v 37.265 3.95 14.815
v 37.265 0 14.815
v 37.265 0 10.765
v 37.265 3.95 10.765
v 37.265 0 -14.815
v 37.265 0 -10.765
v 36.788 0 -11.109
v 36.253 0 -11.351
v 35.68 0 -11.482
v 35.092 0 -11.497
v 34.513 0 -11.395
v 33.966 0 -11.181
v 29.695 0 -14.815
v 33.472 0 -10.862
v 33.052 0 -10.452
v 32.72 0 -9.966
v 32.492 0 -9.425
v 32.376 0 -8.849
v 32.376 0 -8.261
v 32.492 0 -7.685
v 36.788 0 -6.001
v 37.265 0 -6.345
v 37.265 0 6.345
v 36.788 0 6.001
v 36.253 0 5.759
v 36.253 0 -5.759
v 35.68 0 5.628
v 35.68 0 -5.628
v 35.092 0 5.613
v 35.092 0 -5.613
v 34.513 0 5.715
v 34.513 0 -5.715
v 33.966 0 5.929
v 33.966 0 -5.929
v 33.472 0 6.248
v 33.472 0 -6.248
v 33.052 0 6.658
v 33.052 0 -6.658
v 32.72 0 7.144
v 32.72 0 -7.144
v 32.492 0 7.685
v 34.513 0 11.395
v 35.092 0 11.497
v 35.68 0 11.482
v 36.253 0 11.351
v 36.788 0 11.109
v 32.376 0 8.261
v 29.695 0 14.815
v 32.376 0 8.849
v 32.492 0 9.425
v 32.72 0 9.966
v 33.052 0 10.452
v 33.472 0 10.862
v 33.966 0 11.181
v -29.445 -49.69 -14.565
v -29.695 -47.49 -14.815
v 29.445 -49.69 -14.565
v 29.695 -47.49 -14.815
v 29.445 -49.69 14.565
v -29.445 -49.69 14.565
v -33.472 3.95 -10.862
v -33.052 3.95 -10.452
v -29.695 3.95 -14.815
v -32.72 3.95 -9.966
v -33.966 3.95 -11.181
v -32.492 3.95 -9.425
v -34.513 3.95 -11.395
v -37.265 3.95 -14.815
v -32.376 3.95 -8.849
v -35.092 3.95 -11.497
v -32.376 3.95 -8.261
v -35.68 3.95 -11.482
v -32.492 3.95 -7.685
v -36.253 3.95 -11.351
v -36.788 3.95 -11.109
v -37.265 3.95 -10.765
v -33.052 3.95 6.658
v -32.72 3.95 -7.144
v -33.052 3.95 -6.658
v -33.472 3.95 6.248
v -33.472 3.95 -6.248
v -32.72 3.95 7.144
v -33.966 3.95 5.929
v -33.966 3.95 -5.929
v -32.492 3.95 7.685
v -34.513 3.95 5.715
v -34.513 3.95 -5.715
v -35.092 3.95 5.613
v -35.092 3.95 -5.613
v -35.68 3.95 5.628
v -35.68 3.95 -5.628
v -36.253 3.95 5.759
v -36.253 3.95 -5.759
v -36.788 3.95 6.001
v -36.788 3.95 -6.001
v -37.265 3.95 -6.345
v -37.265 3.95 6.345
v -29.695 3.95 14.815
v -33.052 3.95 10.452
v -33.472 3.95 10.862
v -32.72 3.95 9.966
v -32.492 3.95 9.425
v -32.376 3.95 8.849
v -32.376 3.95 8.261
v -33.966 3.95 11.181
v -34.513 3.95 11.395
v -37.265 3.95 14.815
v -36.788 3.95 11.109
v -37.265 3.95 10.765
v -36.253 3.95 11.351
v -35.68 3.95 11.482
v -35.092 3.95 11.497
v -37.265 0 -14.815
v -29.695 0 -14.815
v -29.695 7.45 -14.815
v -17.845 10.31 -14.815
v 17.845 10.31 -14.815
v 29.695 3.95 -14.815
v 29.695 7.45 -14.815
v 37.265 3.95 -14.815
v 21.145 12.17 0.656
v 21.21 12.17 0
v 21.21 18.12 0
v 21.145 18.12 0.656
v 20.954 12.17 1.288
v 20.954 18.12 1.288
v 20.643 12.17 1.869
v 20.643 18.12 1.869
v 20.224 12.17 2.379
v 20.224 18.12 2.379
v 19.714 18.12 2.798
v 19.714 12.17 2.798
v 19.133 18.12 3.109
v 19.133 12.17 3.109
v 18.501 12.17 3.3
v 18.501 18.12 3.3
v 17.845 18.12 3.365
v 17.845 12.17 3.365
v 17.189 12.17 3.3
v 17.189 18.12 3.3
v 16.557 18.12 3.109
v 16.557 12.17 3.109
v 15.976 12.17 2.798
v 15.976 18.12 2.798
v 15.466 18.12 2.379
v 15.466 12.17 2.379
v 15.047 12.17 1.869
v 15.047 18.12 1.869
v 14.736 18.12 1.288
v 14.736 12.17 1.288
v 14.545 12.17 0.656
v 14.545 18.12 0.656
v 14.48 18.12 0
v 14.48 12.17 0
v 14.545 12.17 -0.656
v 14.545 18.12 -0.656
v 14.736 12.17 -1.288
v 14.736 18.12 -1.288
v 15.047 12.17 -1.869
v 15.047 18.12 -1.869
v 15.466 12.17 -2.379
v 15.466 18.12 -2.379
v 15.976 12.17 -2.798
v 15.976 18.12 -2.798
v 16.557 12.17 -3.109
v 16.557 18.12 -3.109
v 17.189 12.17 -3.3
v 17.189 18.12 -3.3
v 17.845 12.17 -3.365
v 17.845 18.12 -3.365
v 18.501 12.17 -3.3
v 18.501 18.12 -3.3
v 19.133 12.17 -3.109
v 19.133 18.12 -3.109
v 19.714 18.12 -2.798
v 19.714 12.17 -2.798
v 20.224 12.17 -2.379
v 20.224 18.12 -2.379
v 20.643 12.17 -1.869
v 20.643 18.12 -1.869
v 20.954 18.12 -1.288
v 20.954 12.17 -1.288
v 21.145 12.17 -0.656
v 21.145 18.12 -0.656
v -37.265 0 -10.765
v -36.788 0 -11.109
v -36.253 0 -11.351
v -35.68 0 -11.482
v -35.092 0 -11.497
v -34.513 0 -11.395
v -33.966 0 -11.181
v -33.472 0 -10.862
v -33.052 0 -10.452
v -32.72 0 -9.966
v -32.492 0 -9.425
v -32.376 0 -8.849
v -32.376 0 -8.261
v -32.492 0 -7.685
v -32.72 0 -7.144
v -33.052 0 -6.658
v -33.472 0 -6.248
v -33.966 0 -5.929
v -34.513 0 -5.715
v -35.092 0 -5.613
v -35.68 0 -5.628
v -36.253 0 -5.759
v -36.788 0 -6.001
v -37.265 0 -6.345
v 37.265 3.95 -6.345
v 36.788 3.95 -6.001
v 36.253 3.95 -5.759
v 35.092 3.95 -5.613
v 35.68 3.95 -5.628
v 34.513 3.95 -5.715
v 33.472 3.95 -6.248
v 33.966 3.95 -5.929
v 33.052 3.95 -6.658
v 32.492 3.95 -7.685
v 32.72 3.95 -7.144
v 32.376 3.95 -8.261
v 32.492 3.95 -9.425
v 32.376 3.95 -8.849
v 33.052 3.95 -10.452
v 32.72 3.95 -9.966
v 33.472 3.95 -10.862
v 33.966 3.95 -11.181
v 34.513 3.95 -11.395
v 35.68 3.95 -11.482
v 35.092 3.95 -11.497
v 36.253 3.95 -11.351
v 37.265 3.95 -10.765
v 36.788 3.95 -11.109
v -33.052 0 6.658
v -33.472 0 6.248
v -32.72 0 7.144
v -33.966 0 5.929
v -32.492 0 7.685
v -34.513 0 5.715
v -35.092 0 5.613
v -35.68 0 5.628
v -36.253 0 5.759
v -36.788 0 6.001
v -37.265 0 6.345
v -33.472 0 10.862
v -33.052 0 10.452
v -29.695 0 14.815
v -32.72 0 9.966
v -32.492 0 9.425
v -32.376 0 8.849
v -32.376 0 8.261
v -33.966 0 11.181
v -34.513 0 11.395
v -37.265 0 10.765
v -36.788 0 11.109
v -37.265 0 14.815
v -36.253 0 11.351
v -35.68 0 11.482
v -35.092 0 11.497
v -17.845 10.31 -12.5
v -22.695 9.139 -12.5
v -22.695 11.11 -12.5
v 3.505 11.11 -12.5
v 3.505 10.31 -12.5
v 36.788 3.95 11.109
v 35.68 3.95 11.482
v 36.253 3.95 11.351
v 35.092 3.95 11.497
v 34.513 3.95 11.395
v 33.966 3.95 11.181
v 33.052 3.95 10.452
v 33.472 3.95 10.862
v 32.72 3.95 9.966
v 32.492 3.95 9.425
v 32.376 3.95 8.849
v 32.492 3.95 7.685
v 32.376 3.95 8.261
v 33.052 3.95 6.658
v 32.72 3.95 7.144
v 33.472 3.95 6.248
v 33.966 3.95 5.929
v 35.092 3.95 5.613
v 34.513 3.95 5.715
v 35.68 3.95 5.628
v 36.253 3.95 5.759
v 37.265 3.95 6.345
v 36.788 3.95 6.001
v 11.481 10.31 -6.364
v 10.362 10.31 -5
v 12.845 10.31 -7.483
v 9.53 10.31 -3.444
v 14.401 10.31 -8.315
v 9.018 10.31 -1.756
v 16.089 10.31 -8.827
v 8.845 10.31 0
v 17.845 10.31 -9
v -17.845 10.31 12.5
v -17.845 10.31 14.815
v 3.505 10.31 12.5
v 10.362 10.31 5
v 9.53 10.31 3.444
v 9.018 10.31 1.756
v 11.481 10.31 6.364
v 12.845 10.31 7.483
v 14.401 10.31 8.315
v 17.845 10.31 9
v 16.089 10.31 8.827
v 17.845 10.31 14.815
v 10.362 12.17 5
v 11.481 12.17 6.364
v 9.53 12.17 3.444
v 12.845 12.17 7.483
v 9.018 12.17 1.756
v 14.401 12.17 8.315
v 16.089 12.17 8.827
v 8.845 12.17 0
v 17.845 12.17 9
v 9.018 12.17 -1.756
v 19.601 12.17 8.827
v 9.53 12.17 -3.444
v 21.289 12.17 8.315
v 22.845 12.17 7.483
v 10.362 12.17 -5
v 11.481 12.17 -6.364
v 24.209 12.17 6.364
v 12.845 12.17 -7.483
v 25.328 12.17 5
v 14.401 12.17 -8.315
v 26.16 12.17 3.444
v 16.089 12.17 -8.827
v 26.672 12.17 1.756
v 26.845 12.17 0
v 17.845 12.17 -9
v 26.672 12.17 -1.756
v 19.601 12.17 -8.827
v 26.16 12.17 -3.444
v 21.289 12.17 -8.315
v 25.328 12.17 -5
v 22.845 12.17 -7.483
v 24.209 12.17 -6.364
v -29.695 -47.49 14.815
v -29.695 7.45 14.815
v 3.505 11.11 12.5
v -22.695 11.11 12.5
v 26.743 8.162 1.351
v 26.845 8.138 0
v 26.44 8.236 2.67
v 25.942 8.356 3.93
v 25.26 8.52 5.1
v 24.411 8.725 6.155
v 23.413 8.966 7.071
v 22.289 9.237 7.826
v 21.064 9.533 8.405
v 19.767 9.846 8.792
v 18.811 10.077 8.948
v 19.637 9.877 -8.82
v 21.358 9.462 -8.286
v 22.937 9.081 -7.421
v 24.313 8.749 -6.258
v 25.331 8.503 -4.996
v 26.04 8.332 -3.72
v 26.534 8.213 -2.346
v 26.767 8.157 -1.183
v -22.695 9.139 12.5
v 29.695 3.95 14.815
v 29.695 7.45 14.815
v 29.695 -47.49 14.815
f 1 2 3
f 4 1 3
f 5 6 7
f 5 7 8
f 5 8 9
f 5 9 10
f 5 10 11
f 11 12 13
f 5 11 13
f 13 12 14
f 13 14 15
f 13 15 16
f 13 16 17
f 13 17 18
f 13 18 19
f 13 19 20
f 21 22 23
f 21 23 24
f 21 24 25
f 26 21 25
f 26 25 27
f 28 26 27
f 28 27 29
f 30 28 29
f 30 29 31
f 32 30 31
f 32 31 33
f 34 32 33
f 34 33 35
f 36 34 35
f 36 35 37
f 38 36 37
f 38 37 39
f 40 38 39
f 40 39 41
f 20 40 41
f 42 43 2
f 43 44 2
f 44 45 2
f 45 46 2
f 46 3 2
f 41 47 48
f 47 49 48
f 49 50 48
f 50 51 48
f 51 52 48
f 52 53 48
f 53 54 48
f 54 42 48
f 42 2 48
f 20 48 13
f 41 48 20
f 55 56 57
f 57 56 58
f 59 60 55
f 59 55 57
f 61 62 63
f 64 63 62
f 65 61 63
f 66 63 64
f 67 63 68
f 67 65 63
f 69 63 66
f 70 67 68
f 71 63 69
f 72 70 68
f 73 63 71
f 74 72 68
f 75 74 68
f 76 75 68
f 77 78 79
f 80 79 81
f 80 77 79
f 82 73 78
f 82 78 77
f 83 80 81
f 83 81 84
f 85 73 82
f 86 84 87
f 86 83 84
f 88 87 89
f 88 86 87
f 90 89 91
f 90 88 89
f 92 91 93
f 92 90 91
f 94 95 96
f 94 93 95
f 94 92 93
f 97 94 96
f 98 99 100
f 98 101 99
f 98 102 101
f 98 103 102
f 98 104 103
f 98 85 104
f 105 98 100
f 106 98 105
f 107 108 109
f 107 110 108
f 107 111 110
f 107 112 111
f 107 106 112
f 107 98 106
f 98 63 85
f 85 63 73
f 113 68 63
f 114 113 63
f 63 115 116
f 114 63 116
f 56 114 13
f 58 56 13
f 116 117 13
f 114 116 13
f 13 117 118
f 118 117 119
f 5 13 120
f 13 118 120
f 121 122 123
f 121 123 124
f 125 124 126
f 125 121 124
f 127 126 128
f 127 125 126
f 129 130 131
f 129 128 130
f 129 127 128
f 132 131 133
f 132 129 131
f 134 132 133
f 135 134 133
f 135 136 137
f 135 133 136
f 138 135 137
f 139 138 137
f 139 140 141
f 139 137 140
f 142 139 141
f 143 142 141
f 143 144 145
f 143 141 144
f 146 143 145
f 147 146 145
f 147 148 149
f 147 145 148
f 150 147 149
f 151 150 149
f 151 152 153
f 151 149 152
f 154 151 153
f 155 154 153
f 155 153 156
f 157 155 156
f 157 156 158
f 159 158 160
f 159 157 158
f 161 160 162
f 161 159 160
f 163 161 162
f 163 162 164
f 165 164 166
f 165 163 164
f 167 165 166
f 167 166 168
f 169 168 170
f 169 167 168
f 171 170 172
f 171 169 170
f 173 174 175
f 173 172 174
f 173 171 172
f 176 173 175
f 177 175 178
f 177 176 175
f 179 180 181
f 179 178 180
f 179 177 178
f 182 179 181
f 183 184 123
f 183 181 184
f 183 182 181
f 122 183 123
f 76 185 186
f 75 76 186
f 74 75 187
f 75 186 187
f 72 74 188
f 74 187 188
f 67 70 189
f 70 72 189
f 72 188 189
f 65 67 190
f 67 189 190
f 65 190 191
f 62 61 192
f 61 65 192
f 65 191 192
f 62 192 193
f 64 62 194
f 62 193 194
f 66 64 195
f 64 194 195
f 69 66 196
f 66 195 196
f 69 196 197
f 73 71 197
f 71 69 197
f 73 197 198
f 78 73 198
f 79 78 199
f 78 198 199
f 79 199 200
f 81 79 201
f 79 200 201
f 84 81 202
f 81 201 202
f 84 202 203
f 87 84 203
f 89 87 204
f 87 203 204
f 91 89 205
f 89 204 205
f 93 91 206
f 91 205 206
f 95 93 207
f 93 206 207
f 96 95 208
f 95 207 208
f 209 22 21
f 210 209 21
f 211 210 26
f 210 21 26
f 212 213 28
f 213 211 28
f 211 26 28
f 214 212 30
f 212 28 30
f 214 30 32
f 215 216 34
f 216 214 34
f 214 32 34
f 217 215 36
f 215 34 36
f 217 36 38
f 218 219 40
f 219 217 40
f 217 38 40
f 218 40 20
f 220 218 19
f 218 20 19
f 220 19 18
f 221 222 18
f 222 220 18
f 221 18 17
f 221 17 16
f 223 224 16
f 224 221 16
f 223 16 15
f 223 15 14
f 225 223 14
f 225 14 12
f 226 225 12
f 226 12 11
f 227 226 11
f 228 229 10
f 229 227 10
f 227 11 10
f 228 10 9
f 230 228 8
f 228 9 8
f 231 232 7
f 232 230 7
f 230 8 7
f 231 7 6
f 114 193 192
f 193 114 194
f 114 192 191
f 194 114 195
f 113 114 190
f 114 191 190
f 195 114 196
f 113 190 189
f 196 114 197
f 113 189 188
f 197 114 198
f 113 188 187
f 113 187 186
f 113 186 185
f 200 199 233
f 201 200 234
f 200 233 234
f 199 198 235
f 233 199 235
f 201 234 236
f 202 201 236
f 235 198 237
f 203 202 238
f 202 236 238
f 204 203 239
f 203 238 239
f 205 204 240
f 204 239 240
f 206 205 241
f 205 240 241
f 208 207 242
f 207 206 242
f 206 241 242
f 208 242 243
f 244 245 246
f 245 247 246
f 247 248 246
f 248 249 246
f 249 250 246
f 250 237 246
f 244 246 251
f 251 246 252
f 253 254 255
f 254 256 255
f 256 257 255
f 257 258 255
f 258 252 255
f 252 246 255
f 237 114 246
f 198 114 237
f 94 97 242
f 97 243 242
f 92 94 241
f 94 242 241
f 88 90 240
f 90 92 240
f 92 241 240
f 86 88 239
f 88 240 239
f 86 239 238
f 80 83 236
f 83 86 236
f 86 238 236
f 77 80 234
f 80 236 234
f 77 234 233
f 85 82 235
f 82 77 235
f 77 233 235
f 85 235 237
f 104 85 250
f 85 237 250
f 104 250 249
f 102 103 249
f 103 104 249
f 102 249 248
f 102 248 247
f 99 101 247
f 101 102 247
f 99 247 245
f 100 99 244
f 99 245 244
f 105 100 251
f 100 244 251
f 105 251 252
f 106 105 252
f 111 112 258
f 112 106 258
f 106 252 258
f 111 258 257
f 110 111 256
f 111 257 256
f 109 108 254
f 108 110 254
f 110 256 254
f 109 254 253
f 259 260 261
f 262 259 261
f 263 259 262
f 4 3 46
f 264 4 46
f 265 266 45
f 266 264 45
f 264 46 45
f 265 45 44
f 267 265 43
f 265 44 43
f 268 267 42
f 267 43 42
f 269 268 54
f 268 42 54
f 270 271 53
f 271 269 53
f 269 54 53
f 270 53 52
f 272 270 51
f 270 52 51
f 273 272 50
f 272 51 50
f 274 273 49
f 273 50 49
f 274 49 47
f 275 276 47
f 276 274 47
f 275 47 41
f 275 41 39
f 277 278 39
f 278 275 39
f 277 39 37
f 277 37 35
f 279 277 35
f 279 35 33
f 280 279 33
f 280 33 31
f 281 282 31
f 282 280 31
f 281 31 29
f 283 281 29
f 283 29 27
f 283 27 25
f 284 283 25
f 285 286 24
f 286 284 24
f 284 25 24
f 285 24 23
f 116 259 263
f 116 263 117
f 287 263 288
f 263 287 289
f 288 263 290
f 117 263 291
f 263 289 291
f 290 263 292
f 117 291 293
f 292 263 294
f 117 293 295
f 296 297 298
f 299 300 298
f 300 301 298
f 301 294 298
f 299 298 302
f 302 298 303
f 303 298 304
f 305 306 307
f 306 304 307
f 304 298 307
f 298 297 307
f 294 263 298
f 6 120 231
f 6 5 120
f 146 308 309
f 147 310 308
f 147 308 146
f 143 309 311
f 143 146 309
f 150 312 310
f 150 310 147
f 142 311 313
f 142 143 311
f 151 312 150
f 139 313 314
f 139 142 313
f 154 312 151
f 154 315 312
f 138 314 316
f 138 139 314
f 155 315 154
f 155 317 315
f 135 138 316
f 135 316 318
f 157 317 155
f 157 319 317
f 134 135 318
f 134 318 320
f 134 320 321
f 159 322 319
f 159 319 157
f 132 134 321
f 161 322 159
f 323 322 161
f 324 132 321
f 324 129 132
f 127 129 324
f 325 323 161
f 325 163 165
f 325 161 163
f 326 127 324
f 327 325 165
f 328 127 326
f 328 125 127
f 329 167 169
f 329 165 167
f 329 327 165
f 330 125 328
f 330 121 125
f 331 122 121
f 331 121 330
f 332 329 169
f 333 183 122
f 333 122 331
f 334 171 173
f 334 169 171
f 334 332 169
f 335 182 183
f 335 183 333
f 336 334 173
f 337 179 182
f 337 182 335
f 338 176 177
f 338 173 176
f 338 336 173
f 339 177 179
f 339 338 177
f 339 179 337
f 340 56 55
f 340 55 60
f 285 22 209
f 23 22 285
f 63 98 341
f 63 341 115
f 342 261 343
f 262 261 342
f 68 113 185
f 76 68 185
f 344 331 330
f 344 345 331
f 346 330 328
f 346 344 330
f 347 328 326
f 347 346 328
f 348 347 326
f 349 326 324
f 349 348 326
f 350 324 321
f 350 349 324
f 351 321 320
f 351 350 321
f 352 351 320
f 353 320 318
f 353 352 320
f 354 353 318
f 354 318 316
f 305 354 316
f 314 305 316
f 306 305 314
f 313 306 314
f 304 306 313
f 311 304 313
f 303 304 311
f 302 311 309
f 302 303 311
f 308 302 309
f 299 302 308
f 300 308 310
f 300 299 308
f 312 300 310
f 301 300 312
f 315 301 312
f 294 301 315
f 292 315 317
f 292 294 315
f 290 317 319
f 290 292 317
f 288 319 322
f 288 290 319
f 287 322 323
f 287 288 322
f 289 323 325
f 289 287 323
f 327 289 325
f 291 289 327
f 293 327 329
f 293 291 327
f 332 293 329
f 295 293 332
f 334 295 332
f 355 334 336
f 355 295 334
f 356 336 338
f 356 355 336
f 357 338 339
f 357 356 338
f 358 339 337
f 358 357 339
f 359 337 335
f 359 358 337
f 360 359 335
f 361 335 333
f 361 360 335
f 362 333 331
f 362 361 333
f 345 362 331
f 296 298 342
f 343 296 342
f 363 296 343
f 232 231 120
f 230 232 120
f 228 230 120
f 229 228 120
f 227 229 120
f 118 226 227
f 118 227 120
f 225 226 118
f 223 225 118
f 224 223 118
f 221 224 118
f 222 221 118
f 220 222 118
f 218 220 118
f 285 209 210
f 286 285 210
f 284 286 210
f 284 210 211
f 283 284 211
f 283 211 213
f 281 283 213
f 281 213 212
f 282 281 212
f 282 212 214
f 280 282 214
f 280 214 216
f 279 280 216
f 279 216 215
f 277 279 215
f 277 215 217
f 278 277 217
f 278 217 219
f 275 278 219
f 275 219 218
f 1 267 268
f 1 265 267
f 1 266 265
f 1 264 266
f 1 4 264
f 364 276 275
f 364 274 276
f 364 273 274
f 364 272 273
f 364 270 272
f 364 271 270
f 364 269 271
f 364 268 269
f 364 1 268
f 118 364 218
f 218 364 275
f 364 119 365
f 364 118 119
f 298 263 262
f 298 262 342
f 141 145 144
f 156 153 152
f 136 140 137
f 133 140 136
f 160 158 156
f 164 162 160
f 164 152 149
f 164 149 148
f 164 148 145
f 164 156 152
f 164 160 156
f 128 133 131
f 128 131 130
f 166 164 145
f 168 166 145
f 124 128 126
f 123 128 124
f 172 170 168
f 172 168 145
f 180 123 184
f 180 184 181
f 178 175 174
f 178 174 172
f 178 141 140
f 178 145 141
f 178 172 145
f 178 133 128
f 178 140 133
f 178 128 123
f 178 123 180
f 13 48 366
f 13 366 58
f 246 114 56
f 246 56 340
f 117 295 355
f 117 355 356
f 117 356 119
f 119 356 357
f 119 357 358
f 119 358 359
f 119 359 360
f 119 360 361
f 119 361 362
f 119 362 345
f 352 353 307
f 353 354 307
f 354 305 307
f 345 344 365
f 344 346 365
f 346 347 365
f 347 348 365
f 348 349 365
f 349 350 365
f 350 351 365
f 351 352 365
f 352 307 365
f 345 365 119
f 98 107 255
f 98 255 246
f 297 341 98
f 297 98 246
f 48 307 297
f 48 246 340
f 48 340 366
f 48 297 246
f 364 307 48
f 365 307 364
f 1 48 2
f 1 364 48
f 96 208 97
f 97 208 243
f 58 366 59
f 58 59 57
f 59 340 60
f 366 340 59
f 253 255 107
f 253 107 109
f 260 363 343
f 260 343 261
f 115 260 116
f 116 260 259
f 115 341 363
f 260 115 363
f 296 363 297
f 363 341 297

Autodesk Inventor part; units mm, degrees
ref_plane "YZ Plane" through (0, 0, 0) normal (1, 0, 0) x (0, 1, 0)
ref_plane "XZ Plane" through (0, 0, 0) normal (0, 1, 0) x (-1, 0, 0)
ref_plane "XY Plane" through (0, 0, 0) normal (0, 0, 1) x (1, 0, 0)
sketch "Sketch1" plane through (0, 0, 0) normal (0, 1, 0) x (-1, 0, 0)
  line L0 (0, -23.3131) -> (0, 24.6505)
  line L1 (49.2542, 0) -> (-47.6933, 0)
  arc A0 (37.265, -6.345) -> (37.265, -10.765) centre (35.3109, -8.555) ccw
  line L2 (37.265, -14.815) -> (37.265, -10.765)
  arc A1 (37.265, 10.765) -> (37.265, 6.345) centre (35.3109, 8.555) ccw
  line L3 (37.265, 14.815) -> (37.265, 10.765)
  line L4 (37.265, -6.345) -> (37.265, 6.345)
  line L5 (37.265, -14.815) -> (29.695, -14.815)
  line L6 (37.265, 14.815) -> (29.695, 14.815)
  arc A2 (-37.265, -10.765) -> (-37.265, -6.345) centre (-35.3109, -8.555) ccw
  line L7 (-37.265, -14.815) -> (-37.265, -10.765)
  line L8 (-37.265, 14.815) -> (-37.265, 10.765)
  arc A3 (-37.265, 6.345) -> (-37.265, 10.765) centre (-35.3109, 8.555) ccw
  line L9 (-37.265, -6.345) -> (-37.265, 6.345)
  line L10 (-37.265, -14.815) -> (-29.695, -14.815)
  line L11 (-37.265, 14.815) -> (-29.695, 14.815)
  line L12 (29.695, -14.815) -> (-29.695, -14.815)
  line L13 (-29.695, 14.815) -> (29.695, 14.815)
  line L14 (29.695, -14.815) -> (29.695, 14.815)
  line L15 (-29.695, -14.815) -> (-29.695, 14.815)
  point P0 (0, 0)
  dimension "d3" = 4.42
  dimension "d6" = 2.95
  dimension "d7" = 7.57
  dimension "d8" = 3.31
  dimension "d9" = 59.39
  dimension "d10" = 29.63
extrude "Extrusion1" add sketch "Sketch1" along normal blind 3.95
sketch "Sketch2" plane through (0, 3.95, 0) normal (0, 1, 0) x (1, 0, 0)
  line L0 (37.265, 14.815) -> (-37.265, 14.815) projected
  line L1 (-37.265, -14.815) -> (37.265, -14.815) projected
  line L2 (-29.695, 14.815) -> (29.695, 14.815)
  line L3 (29.695, 14.815) -> (29.695, -14.815)
  line L4 (29.695, -14.815) -> (-29.695, -14.815)
  line L5 (-29.695, -14.815) -> (-29.695, 14.815)
  point P0 (0, 0)
  dimension "d13" = 59.39
  dimension "d14" = 29.695
extrude "Extrusion2" add sketch "Sketch2" along normal blind 3.5
sketch "Sketch3" plane through (0, 0, 0) normal (0, -1, 0) x (1, 0, 0)
  line L0 (37.265, -14.815) -> (-37.265, -14.815) projected
  line L1 (-37.265, 14.815) -> (37.265, 14.815) projected
  line L2 (-29.695, 14.815) -> (29.695, 14.815)
  line L3 (29.695, 14.815) -> (29.695, -14.815)
  line L4 (29.695, -14.815) -> (-29.695, -14.815)
  line L5 (-29.695, -14.815) -> (-29.695, 14.815)
  point P0 (0, 0)
  dimension "d17" = 59.39
  dimension "d18" = 29.695
extrude "Extrusion3" add sketch "Sketch3" along normal blind 49.69
sketch "Sketch4" plane through (37.265, 0, 14.815) normal (0, 0, 1) x (1, 0, 0)
  line L0 (-7.57, -49.69) -> (-66.96, -49.69) projected
  line L1 (-66.96, 7.45) -> (-7.57, 7.45) projected
  line L2 (-74.53, 0) -> (-74.53, 3.95) projected
  line L3 (-66.96, 7.45) -> (-55.11, 10.31)
  line L4 (-55.11, 10.31) -> (-19.42, 10.31)
  line L5 (-19.42, 10.31) -> (-7.57, 7.45)
  line L6 (14.6439, 12.17) -> (-93.8376, 12.17) construction
  line L7 (-75.1527, 11.11) -> (-5.1295, 11.11) construction
  point P0 (-37.265, 0)
  dimension "d21" = 11.85
  dimension "d22" = 11.85
  dimension "d31" = 1.06
  dimension "d32" = 0.8
  dimension "d44" = 60.8
sketch "Sketch5" plane through (0, 7.45, 0) normal (0, 1, 0) x (1, 0, 0)
  line L0 (29.695, -14.815) -> (29.695, 14.815) projected
  line L1 (29.695, 14.815) -> (-29.695, 14.815) projected
  circle A0 centre (17.845, 0) radius 9
  point P0 (0, 0)
  dimension "d23" = 11.85
  dimension "d24" = 18
  dimension "d29" = 14.815
extrude "Extrusion4" add sketch "Sketch5" along normal blind 4.72
sketch "Sketch6" plane through (0, 7.45, 0) normal (0, 1, 0) x (1, 0, 0)
  line L0 (-29.695, 14.815) -> (-29.695, -14.815) projected
  line L1 (-22.695, 12.5) -> (3.505, 12.5)
  line L2 (3.505, 12.5) -> (3.505, -12.5)
  line L3 (3.505, -12.5) -> (-22.695, -12.5)
  line L4 (-22.695, -12.5) -> (-22.695, 12.5)
  line L5 (-37.265, 6.345) -> (-37.265, -6.345) projected
  point P0 (0, 0)
  dimension "d35" = 25
  dimension "d36" = 12.5
  dimension "d38" = 26.2
  dimension "d39" = 7
extrude "Extrusion5" add sketch "Sketch6" along normal blind 3.66
extrude "Extrusion6" add sketch "Sketch4" against normal up to surface (29.63 mm away)
sketch "Sketch7" plane through (17.845, 12.17, 0) normal (0, 1, 0) x (1, 0, 0)
  circle A0 centre (0, 0) radius 9 projected
  circle A1 centre (0, 0) radius 3.365
  point P0 (-17.845, 0)
  dimension "d45" = 6.73
extrude "Extrusion7" add sketch "Sketch7" along normal blind 5.95 contours A1
chamfer "Chamfer1" distance 0.25 distance2 2.2 1 edges at (0, -49.69, -14.815) measured on face at (-9.8983, -49.69, 4.9383)
chamfer "Chamfer2" distance 0.25 distance2 2.2 1 edges at (0, -49.69, 14.815) measured on face at (9.8983, -49.69, -4.7717)
chamfer "Chamfer3" distance 0.25 distance2 2.2 1 edges at (29.695, -49.69, 0) measured on face at (-9.8983, -49.69, 4.855)
chamfer "Chamfer4" distance 0.25 distance2 2.2 1 edges at (-29.695, -49.69, 0) measured on face at (-9.9817, -49.69, 4.855)
equation "\"d13\" = d9"
equation "\"d14\" = 0.5 * d9"
equation "\"d17\" = d9"
equation "\"d18\" = 0.5 * d9"
equation "\"d22\" = d21"
equation "\"d29\" = 0.5 * d10"
equation "\"d36\" = 0.5 * d35"
properties part number "ServoModel"
